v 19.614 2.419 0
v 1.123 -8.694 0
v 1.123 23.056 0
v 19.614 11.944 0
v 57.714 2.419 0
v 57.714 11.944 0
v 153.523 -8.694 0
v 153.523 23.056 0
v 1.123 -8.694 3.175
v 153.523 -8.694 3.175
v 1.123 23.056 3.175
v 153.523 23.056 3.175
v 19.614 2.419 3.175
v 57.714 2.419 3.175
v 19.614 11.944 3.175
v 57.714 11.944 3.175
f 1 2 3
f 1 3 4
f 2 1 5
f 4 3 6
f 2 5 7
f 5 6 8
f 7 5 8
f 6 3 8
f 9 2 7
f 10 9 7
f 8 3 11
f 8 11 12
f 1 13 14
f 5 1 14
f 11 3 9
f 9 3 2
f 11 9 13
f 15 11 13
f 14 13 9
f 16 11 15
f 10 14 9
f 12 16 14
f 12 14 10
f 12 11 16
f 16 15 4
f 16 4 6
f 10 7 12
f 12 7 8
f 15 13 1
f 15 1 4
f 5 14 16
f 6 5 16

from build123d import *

# Parameters (mm, degrees)
F0_W     = 152.4
F0_H     = 14.740049
F0_H_2   = 8.316415
F0_H_3   = 8.693536
F1_DEPTH = 3.175
F2_DEPTH = 55.118
F3_W     = 38.1
F3_H     = 9.525
F4_DEPTH = 25.4


with BuildPart() as f1:
    # F0 (on Top) → F1 (new body)
    with BuildSketch(Plane.XY):
        with Locations((77.322651, 15.686439)):
            Rectangle(F0_W, F0_H)
        with Locations((77.322651, 4.158207)):
            Rectangle(F0_W, F0_H_2)
        with Locations((77.322651, -4.346768)):
            Rectangle(F0_W, F0_H_3)
    extrude(amount=F1_DEPTH)

    # F0 (on Top) → F2 (cut)
    with BuildSketch(Plane.XY):
        with Locations((77.322651, 4.158207)):
            Rectangle(F0_W, F0_H_2)
    extrude(amount=-F2_DEPTH, mode=Mode.SUBTRACT)

    # F3 (on face) → F4 (cut)
    with BuildSketch(Plane.XY.offset(3.175)):
        with Locations((38.663851, 7.181464)):
            Rectangle(F3_W, F3_H)
    extrude(amount=-F4_DEPTH, mode=Mode.SUBTRACT)


solid = f1.part
